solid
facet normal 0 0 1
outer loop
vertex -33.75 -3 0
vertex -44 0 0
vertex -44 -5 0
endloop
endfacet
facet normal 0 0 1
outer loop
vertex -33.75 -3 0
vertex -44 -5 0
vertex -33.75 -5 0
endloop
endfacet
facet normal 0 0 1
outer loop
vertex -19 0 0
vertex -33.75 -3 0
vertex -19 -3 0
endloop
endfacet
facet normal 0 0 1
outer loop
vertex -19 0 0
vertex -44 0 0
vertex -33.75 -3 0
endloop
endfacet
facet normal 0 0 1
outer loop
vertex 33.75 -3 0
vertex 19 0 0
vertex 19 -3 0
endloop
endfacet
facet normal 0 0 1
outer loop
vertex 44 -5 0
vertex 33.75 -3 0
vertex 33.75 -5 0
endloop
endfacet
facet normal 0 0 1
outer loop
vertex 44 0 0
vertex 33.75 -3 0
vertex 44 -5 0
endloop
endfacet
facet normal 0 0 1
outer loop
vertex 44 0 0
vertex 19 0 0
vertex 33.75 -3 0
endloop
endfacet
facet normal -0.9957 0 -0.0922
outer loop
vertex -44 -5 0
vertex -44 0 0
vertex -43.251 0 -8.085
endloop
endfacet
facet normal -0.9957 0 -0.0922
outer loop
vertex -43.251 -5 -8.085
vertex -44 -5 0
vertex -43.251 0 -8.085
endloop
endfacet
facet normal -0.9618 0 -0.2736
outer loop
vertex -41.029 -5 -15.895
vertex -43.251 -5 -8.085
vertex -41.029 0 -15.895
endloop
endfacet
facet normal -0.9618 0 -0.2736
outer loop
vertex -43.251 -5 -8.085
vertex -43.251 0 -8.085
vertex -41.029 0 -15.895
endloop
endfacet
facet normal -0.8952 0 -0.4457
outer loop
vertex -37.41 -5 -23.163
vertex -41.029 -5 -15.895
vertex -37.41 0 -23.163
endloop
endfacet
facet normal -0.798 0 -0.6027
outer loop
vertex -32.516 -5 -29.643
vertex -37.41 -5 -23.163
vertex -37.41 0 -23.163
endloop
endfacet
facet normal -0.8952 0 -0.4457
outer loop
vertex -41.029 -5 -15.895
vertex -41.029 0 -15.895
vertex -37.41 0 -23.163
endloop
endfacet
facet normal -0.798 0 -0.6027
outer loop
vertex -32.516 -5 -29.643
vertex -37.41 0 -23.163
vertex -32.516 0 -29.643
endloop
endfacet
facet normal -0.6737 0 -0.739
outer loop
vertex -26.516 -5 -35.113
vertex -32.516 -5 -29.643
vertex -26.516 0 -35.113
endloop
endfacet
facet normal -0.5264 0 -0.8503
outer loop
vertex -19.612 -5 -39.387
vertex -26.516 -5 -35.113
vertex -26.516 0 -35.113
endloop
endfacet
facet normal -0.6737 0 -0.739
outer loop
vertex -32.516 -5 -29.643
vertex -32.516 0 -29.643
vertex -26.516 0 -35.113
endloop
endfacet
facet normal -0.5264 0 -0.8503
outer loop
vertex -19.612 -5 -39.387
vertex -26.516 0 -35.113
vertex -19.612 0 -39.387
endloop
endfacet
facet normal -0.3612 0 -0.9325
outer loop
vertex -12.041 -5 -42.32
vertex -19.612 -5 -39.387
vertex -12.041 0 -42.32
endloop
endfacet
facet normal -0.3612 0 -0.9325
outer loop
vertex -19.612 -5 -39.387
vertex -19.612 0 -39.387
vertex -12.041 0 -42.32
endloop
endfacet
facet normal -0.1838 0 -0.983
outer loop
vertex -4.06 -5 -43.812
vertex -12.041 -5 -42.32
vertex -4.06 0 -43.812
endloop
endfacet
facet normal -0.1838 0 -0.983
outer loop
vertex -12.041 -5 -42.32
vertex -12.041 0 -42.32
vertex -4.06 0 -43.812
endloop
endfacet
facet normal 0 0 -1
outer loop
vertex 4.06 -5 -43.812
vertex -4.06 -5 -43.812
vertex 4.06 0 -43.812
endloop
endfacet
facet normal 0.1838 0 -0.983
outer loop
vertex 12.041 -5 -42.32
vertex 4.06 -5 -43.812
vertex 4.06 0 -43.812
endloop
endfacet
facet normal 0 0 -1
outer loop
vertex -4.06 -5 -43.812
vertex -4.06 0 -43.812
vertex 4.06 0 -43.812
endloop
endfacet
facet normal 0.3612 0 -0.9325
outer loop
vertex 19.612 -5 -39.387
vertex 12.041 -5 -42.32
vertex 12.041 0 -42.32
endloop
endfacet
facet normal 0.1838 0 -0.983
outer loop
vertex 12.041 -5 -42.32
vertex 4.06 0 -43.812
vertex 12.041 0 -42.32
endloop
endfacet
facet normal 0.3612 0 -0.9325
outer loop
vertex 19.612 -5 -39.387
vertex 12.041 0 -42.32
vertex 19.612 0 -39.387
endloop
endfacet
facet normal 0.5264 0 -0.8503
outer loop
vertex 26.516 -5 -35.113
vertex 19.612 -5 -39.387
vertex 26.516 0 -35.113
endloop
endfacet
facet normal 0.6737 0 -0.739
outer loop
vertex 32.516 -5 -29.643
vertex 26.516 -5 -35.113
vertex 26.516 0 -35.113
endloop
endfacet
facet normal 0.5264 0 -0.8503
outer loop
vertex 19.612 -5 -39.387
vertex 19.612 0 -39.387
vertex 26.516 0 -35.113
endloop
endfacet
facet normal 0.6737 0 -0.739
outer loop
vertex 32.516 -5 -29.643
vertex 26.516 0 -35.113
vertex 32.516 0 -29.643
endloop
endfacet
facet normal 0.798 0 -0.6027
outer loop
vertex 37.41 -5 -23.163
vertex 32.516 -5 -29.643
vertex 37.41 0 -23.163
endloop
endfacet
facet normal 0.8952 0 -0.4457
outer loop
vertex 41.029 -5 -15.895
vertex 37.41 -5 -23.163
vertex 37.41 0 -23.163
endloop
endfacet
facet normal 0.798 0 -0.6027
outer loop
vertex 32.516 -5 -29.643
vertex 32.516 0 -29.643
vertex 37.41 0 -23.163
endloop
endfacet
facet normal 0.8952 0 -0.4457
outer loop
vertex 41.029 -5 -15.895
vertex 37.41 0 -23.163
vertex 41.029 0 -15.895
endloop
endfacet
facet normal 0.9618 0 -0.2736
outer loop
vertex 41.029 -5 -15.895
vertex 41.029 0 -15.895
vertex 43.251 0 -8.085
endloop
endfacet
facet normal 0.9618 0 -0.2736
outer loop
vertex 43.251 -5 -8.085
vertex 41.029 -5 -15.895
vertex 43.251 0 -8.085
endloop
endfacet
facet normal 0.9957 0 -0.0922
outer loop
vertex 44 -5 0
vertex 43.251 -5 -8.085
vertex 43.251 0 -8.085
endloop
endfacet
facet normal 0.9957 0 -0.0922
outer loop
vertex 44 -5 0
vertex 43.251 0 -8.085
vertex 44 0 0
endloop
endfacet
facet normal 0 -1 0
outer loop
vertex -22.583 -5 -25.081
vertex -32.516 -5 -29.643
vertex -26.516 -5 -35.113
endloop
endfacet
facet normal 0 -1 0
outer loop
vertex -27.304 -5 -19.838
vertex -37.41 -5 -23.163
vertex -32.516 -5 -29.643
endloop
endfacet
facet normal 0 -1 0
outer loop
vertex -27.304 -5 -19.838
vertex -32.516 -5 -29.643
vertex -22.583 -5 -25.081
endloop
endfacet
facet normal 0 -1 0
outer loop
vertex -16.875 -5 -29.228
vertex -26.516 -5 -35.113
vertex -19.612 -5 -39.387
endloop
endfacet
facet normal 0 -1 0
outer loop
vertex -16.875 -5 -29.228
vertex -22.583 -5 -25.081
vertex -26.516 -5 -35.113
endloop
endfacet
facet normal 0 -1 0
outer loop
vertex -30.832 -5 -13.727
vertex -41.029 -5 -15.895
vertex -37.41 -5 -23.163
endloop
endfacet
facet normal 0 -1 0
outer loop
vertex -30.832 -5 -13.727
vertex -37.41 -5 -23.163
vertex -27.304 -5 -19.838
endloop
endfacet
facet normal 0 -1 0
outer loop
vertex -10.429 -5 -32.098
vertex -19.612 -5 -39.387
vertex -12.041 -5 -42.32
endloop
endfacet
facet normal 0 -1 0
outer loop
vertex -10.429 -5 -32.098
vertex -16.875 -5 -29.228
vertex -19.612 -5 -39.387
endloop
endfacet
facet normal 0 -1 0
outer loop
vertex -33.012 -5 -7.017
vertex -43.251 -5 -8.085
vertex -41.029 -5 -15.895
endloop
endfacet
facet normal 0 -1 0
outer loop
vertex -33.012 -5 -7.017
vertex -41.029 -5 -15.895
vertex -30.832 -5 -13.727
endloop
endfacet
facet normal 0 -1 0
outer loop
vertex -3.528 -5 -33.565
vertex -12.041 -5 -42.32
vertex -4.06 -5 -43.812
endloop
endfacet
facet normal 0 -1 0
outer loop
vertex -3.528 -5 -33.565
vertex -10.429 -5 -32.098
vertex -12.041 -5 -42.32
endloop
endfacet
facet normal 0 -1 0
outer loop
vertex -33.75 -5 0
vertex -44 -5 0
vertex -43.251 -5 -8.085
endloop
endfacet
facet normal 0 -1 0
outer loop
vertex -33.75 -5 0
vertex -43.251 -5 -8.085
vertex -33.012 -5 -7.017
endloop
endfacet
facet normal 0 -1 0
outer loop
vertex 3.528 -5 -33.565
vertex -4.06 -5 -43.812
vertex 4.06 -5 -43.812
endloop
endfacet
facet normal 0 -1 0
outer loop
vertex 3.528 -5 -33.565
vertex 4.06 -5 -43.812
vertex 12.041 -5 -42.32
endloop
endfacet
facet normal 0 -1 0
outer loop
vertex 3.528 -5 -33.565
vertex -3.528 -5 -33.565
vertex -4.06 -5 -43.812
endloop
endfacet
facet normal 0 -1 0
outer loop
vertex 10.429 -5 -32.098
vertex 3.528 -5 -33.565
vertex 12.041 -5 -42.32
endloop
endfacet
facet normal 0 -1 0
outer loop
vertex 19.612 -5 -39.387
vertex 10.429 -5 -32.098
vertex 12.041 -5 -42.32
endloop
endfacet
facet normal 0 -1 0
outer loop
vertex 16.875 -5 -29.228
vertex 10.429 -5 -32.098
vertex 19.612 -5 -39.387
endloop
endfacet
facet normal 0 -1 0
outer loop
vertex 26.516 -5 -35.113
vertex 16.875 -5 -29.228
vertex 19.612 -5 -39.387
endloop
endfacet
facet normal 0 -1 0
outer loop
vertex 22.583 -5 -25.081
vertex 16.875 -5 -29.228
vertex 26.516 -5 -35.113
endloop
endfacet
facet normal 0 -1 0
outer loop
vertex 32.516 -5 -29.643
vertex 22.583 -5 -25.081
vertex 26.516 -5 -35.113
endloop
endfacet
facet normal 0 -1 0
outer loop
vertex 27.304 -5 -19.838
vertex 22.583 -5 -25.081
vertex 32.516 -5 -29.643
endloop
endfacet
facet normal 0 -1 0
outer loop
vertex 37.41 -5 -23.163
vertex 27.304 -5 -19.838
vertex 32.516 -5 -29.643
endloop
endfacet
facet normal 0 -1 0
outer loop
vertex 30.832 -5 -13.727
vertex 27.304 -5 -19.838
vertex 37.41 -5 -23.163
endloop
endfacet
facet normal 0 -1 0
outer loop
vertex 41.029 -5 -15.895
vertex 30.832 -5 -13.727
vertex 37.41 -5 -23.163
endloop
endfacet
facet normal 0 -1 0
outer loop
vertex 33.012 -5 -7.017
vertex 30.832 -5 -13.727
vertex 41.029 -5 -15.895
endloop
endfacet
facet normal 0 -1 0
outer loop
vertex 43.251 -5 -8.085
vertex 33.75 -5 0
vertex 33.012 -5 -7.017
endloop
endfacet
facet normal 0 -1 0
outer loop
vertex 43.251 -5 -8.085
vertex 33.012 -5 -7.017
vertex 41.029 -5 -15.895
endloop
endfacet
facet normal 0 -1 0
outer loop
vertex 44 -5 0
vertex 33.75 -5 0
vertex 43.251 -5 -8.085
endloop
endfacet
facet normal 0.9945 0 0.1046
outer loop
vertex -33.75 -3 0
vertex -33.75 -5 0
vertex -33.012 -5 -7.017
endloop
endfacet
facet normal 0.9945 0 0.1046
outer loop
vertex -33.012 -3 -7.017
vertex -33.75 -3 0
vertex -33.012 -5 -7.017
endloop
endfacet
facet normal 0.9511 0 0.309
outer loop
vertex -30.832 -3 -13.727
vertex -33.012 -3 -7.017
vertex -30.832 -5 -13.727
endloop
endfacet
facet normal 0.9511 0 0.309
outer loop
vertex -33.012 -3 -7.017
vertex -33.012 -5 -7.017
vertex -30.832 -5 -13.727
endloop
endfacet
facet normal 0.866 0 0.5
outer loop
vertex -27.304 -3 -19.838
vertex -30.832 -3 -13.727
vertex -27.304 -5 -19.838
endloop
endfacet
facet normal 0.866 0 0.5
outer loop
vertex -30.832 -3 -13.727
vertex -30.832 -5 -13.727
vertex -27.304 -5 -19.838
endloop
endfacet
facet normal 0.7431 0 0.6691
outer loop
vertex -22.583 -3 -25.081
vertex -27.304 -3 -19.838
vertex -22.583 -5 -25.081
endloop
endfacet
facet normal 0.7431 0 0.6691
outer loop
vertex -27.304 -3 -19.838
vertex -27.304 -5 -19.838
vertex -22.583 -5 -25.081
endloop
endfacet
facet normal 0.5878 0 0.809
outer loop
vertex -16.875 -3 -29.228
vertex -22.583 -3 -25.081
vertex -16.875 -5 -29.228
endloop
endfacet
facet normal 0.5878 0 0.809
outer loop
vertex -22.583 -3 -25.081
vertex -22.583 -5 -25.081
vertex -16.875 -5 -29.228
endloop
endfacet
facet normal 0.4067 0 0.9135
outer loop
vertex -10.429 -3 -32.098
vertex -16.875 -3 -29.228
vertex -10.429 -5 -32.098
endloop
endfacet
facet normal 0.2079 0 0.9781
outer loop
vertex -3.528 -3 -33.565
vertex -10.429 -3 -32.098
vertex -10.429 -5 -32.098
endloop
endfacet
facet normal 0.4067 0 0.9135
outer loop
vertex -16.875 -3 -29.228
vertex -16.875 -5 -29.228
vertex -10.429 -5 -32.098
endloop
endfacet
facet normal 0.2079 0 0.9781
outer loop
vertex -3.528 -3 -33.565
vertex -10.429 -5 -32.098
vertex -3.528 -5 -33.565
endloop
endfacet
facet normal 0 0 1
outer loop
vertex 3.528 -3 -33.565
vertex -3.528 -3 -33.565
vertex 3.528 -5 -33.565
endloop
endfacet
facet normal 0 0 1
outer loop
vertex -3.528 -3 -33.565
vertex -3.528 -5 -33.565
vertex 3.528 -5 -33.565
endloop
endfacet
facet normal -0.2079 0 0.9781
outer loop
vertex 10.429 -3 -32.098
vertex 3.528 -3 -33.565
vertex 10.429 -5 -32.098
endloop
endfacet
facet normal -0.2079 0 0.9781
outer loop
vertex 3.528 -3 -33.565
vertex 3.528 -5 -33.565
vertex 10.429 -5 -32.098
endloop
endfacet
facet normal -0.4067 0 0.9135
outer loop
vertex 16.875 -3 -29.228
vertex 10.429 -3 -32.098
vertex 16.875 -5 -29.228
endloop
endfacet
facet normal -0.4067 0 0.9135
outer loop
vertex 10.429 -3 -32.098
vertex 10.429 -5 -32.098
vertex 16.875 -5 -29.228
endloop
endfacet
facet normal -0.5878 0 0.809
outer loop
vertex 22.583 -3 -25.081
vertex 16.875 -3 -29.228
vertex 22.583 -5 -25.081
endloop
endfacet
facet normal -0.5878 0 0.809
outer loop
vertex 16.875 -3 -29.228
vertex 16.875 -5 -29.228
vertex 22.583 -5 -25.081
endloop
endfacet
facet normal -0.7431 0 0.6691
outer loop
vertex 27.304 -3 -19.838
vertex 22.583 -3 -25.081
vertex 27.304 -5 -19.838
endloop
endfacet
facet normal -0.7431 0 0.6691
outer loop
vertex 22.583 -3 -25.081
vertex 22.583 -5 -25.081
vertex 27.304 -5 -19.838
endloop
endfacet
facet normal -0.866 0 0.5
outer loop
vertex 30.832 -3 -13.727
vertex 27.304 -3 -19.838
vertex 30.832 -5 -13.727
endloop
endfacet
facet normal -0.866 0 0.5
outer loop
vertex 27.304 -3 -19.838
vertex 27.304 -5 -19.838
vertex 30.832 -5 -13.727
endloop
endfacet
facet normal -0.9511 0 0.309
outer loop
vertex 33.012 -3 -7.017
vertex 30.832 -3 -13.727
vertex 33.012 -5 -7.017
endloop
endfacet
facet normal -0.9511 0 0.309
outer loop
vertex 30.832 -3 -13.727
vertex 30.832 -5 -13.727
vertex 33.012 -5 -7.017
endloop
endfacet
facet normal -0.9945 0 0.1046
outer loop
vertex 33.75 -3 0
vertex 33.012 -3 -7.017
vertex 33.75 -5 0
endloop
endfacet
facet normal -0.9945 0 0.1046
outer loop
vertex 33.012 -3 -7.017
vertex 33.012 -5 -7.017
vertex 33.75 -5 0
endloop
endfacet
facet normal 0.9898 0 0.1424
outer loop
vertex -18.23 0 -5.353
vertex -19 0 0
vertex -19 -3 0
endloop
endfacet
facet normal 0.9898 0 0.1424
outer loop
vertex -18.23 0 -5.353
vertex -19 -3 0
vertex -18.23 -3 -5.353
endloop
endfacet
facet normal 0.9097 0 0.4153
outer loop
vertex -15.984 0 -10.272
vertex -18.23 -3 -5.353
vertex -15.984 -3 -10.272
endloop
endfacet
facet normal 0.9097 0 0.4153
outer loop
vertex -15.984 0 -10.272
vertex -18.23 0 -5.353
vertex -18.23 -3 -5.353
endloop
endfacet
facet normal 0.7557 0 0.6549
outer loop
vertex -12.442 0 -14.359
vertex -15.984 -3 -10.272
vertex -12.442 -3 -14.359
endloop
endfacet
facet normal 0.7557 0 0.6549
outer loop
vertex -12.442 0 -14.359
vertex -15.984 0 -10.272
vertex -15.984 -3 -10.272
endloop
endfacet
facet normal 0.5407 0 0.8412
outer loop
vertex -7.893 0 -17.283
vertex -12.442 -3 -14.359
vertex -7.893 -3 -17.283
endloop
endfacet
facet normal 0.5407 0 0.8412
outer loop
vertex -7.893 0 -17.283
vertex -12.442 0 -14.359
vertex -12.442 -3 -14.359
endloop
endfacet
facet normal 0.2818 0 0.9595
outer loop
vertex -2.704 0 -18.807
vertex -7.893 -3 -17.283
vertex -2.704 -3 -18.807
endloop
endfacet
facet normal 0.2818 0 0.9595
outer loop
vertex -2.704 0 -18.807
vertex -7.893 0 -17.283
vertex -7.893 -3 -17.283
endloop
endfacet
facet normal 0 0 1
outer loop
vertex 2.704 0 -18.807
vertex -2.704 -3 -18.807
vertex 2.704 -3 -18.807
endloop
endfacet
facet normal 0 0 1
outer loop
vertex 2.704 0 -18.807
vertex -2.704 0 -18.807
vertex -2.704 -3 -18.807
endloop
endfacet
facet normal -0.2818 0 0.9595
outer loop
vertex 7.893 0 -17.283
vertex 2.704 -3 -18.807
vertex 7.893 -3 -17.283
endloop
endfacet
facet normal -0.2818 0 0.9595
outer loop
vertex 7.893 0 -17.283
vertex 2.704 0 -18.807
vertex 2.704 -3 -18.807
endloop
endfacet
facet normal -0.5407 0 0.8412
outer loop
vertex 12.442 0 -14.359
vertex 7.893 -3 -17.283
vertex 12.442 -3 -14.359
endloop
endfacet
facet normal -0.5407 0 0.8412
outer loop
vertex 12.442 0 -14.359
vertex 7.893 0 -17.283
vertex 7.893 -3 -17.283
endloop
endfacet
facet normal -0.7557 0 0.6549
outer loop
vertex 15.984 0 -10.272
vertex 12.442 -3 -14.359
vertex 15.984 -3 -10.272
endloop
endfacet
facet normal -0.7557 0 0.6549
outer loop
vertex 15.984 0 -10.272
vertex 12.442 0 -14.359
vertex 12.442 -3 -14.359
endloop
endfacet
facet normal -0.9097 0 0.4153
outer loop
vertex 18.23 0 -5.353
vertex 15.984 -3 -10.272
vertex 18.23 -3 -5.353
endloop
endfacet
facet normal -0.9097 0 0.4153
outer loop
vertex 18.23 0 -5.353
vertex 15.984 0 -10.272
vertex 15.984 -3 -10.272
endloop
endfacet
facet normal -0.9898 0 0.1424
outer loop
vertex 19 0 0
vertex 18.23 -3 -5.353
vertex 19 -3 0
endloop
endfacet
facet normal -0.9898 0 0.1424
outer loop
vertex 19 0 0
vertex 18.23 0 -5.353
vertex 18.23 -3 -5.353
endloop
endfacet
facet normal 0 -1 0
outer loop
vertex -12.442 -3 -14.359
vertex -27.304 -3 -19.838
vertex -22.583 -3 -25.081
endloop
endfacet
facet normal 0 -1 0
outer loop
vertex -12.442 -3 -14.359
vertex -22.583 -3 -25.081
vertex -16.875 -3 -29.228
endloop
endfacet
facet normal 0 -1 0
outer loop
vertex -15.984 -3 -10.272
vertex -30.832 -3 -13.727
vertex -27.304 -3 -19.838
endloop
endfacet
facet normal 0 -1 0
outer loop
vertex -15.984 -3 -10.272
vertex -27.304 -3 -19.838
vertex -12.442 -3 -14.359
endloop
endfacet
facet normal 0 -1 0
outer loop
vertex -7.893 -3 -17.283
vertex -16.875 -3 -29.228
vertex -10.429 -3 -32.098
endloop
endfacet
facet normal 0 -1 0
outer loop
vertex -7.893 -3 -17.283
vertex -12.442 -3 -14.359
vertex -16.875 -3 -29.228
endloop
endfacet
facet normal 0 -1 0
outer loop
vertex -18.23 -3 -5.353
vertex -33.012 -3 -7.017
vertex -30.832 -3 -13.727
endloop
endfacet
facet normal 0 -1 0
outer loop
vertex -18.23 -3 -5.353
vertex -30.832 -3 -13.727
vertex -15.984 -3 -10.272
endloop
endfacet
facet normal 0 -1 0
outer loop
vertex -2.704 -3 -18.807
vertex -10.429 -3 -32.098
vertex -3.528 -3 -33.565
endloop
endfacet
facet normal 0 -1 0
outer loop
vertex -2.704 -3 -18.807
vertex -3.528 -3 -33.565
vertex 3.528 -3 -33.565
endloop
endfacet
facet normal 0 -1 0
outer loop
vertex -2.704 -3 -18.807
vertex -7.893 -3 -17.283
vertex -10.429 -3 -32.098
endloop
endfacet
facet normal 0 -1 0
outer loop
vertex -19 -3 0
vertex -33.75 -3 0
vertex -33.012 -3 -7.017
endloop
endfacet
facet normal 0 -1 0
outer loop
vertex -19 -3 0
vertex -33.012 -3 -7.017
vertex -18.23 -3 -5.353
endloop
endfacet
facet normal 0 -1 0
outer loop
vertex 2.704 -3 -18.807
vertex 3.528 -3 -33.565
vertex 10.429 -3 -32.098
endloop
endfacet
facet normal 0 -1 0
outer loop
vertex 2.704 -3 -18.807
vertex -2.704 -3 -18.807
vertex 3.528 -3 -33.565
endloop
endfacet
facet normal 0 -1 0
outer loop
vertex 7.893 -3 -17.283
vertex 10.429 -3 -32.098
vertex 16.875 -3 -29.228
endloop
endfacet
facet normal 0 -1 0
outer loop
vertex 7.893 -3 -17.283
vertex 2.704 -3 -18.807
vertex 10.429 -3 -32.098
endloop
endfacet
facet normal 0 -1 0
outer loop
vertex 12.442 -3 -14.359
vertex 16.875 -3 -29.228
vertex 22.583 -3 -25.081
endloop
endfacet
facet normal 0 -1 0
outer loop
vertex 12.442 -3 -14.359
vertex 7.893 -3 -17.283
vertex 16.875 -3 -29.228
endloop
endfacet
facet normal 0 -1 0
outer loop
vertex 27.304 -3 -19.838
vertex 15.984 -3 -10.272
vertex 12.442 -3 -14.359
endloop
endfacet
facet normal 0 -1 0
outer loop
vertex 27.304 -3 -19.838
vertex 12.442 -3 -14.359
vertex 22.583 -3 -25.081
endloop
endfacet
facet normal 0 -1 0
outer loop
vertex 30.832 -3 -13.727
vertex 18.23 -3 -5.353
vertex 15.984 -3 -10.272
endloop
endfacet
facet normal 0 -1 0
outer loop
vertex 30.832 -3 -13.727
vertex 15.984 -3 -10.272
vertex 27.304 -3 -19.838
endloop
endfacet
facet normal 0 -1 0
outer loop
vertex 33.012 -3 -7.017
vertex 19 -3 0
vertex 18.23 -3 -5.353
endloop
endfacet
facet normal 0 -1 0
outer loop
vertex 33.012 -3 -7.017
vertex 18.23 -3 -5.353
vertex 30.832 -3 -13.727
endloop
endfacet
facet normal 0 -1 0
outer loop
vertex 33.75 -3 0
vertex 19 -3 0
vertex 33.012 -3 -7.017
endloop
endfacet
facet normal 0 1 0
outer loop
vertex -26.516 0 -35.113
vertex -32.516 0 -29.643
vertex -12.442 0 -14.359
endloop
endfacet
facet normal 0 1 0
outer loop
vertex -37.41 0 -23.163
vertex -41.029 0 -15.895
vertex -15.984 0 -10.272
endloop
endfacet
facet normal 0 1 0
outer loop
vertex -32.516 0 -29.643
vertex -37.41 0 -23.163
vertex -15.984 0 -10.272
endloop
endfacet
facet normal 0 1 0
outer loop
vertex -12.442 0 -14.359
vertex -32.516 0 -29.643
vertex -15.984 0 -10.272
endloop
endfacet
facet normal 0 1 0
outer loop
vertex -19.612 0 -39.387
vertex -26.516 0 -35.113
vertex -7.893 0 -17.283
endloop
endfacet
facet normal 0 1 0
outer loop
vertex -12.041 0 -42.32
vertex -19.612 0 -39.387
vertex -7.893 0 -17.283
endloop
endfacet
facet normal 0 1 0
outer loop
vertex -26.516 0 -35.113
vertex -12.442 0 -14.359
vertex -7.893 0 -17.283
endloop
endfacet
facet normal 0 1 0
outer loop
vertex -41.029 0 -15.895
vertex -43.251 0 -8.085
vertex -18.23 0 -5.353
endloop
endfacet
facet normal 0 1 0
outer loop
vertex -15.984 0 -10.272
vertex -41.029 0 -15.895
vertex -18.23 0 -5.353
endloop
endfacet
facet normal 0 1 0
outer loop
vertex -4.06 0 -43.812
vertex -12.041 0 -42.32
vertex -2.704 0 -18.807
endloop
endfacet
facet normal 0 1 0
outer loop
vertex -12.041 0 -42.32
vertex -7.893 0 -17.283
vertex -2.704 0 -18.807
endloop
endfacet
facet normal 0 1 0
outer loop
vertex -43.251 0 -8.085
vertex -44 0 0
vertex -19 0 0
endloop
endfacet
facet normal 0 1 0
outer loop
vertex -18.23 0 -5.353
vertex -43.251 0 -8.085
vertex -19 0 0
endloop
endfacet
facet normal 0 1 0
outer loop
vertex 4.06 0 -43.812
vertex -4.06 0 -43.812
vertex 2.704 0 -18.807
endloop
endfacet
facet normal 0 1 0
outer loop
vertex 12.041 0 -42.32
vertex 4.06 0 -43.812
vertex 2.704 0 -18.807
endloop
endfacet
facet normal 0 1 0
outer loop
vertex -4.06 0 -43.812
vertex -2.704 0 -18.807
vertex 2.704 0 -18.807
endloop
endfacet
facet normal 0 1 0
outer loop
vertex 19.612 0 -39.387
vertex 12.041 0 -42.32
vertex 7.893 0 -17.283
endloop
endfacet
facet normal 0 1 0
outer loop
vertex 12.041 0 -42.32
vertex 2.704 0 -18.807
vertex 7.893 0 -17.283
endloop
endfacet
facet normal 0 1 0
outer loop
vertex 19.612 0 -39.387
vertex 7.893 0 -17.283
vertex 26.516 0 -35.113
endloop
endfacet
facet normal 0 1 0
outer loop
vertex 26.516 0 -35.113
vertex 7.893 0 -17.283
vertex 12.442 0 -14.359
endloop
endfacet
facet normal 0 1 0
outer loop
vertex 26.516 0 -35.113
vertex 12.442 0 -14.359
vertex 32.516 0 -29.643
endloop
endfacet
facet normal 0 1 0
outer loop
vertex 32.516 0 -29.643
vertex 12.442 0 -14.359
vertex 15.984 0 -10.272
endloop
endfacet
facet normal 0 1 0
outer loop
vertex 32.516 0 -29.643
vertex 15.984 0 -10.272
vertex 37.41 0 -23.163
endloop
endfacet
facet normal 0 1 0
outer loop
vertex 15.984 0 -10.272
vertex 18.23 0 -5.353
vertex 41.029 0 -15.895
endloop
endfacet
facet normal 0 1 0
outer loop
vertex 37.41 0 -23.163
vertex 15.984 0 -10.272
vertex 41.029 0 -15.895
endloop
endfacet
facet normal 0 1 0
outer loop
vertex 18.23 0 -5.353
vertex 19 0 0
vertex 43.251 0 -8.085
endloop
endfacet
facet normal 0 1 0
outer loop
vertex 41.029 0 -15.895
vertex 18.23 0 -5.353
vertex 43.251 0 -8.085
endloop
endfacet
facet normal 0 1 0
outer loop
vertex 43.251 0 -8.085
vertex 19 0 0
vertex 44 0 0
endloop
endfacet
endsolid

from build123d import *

# Parameters (mm, degrees)
F0_R     = 44
F0_R_2   = 19
F1_DEPTH = 5
F2_R     = 33.75
F3_DEPTH = 2
F5_DEPTH = 25


with BuildPart() as f1:
    # F0 (on Front) → F1 (new body)
    with BuildSketch(Plane.XZ):
        Circle(F0_R)
        Circle(F0_R_2, mode=Mode.SUBTRACT)
    extrude(amount=F1_DEPTH)

    # F2 (on face) → F3 (cut)
    with BuildSketch(Plane.XZ.offset(5)):
        Circle(F2_R)
    extrude(amount=-F3_DEPTH, mode=Mode.SUBTRACT)

    # F4 (on Front) → F5 (cut)
    with BuildSketch(Plane.XZ):
        Polygon((-49.323015, 0), (0, 0), (50.371692, 0), (50.371692, 35.833221), (0, 51.775392), (-49.323015, 41.89574), align=None)
    extrude(amount=F5_DEPTH, mode=Mode.SUBTRACT)


solid = f1.part
